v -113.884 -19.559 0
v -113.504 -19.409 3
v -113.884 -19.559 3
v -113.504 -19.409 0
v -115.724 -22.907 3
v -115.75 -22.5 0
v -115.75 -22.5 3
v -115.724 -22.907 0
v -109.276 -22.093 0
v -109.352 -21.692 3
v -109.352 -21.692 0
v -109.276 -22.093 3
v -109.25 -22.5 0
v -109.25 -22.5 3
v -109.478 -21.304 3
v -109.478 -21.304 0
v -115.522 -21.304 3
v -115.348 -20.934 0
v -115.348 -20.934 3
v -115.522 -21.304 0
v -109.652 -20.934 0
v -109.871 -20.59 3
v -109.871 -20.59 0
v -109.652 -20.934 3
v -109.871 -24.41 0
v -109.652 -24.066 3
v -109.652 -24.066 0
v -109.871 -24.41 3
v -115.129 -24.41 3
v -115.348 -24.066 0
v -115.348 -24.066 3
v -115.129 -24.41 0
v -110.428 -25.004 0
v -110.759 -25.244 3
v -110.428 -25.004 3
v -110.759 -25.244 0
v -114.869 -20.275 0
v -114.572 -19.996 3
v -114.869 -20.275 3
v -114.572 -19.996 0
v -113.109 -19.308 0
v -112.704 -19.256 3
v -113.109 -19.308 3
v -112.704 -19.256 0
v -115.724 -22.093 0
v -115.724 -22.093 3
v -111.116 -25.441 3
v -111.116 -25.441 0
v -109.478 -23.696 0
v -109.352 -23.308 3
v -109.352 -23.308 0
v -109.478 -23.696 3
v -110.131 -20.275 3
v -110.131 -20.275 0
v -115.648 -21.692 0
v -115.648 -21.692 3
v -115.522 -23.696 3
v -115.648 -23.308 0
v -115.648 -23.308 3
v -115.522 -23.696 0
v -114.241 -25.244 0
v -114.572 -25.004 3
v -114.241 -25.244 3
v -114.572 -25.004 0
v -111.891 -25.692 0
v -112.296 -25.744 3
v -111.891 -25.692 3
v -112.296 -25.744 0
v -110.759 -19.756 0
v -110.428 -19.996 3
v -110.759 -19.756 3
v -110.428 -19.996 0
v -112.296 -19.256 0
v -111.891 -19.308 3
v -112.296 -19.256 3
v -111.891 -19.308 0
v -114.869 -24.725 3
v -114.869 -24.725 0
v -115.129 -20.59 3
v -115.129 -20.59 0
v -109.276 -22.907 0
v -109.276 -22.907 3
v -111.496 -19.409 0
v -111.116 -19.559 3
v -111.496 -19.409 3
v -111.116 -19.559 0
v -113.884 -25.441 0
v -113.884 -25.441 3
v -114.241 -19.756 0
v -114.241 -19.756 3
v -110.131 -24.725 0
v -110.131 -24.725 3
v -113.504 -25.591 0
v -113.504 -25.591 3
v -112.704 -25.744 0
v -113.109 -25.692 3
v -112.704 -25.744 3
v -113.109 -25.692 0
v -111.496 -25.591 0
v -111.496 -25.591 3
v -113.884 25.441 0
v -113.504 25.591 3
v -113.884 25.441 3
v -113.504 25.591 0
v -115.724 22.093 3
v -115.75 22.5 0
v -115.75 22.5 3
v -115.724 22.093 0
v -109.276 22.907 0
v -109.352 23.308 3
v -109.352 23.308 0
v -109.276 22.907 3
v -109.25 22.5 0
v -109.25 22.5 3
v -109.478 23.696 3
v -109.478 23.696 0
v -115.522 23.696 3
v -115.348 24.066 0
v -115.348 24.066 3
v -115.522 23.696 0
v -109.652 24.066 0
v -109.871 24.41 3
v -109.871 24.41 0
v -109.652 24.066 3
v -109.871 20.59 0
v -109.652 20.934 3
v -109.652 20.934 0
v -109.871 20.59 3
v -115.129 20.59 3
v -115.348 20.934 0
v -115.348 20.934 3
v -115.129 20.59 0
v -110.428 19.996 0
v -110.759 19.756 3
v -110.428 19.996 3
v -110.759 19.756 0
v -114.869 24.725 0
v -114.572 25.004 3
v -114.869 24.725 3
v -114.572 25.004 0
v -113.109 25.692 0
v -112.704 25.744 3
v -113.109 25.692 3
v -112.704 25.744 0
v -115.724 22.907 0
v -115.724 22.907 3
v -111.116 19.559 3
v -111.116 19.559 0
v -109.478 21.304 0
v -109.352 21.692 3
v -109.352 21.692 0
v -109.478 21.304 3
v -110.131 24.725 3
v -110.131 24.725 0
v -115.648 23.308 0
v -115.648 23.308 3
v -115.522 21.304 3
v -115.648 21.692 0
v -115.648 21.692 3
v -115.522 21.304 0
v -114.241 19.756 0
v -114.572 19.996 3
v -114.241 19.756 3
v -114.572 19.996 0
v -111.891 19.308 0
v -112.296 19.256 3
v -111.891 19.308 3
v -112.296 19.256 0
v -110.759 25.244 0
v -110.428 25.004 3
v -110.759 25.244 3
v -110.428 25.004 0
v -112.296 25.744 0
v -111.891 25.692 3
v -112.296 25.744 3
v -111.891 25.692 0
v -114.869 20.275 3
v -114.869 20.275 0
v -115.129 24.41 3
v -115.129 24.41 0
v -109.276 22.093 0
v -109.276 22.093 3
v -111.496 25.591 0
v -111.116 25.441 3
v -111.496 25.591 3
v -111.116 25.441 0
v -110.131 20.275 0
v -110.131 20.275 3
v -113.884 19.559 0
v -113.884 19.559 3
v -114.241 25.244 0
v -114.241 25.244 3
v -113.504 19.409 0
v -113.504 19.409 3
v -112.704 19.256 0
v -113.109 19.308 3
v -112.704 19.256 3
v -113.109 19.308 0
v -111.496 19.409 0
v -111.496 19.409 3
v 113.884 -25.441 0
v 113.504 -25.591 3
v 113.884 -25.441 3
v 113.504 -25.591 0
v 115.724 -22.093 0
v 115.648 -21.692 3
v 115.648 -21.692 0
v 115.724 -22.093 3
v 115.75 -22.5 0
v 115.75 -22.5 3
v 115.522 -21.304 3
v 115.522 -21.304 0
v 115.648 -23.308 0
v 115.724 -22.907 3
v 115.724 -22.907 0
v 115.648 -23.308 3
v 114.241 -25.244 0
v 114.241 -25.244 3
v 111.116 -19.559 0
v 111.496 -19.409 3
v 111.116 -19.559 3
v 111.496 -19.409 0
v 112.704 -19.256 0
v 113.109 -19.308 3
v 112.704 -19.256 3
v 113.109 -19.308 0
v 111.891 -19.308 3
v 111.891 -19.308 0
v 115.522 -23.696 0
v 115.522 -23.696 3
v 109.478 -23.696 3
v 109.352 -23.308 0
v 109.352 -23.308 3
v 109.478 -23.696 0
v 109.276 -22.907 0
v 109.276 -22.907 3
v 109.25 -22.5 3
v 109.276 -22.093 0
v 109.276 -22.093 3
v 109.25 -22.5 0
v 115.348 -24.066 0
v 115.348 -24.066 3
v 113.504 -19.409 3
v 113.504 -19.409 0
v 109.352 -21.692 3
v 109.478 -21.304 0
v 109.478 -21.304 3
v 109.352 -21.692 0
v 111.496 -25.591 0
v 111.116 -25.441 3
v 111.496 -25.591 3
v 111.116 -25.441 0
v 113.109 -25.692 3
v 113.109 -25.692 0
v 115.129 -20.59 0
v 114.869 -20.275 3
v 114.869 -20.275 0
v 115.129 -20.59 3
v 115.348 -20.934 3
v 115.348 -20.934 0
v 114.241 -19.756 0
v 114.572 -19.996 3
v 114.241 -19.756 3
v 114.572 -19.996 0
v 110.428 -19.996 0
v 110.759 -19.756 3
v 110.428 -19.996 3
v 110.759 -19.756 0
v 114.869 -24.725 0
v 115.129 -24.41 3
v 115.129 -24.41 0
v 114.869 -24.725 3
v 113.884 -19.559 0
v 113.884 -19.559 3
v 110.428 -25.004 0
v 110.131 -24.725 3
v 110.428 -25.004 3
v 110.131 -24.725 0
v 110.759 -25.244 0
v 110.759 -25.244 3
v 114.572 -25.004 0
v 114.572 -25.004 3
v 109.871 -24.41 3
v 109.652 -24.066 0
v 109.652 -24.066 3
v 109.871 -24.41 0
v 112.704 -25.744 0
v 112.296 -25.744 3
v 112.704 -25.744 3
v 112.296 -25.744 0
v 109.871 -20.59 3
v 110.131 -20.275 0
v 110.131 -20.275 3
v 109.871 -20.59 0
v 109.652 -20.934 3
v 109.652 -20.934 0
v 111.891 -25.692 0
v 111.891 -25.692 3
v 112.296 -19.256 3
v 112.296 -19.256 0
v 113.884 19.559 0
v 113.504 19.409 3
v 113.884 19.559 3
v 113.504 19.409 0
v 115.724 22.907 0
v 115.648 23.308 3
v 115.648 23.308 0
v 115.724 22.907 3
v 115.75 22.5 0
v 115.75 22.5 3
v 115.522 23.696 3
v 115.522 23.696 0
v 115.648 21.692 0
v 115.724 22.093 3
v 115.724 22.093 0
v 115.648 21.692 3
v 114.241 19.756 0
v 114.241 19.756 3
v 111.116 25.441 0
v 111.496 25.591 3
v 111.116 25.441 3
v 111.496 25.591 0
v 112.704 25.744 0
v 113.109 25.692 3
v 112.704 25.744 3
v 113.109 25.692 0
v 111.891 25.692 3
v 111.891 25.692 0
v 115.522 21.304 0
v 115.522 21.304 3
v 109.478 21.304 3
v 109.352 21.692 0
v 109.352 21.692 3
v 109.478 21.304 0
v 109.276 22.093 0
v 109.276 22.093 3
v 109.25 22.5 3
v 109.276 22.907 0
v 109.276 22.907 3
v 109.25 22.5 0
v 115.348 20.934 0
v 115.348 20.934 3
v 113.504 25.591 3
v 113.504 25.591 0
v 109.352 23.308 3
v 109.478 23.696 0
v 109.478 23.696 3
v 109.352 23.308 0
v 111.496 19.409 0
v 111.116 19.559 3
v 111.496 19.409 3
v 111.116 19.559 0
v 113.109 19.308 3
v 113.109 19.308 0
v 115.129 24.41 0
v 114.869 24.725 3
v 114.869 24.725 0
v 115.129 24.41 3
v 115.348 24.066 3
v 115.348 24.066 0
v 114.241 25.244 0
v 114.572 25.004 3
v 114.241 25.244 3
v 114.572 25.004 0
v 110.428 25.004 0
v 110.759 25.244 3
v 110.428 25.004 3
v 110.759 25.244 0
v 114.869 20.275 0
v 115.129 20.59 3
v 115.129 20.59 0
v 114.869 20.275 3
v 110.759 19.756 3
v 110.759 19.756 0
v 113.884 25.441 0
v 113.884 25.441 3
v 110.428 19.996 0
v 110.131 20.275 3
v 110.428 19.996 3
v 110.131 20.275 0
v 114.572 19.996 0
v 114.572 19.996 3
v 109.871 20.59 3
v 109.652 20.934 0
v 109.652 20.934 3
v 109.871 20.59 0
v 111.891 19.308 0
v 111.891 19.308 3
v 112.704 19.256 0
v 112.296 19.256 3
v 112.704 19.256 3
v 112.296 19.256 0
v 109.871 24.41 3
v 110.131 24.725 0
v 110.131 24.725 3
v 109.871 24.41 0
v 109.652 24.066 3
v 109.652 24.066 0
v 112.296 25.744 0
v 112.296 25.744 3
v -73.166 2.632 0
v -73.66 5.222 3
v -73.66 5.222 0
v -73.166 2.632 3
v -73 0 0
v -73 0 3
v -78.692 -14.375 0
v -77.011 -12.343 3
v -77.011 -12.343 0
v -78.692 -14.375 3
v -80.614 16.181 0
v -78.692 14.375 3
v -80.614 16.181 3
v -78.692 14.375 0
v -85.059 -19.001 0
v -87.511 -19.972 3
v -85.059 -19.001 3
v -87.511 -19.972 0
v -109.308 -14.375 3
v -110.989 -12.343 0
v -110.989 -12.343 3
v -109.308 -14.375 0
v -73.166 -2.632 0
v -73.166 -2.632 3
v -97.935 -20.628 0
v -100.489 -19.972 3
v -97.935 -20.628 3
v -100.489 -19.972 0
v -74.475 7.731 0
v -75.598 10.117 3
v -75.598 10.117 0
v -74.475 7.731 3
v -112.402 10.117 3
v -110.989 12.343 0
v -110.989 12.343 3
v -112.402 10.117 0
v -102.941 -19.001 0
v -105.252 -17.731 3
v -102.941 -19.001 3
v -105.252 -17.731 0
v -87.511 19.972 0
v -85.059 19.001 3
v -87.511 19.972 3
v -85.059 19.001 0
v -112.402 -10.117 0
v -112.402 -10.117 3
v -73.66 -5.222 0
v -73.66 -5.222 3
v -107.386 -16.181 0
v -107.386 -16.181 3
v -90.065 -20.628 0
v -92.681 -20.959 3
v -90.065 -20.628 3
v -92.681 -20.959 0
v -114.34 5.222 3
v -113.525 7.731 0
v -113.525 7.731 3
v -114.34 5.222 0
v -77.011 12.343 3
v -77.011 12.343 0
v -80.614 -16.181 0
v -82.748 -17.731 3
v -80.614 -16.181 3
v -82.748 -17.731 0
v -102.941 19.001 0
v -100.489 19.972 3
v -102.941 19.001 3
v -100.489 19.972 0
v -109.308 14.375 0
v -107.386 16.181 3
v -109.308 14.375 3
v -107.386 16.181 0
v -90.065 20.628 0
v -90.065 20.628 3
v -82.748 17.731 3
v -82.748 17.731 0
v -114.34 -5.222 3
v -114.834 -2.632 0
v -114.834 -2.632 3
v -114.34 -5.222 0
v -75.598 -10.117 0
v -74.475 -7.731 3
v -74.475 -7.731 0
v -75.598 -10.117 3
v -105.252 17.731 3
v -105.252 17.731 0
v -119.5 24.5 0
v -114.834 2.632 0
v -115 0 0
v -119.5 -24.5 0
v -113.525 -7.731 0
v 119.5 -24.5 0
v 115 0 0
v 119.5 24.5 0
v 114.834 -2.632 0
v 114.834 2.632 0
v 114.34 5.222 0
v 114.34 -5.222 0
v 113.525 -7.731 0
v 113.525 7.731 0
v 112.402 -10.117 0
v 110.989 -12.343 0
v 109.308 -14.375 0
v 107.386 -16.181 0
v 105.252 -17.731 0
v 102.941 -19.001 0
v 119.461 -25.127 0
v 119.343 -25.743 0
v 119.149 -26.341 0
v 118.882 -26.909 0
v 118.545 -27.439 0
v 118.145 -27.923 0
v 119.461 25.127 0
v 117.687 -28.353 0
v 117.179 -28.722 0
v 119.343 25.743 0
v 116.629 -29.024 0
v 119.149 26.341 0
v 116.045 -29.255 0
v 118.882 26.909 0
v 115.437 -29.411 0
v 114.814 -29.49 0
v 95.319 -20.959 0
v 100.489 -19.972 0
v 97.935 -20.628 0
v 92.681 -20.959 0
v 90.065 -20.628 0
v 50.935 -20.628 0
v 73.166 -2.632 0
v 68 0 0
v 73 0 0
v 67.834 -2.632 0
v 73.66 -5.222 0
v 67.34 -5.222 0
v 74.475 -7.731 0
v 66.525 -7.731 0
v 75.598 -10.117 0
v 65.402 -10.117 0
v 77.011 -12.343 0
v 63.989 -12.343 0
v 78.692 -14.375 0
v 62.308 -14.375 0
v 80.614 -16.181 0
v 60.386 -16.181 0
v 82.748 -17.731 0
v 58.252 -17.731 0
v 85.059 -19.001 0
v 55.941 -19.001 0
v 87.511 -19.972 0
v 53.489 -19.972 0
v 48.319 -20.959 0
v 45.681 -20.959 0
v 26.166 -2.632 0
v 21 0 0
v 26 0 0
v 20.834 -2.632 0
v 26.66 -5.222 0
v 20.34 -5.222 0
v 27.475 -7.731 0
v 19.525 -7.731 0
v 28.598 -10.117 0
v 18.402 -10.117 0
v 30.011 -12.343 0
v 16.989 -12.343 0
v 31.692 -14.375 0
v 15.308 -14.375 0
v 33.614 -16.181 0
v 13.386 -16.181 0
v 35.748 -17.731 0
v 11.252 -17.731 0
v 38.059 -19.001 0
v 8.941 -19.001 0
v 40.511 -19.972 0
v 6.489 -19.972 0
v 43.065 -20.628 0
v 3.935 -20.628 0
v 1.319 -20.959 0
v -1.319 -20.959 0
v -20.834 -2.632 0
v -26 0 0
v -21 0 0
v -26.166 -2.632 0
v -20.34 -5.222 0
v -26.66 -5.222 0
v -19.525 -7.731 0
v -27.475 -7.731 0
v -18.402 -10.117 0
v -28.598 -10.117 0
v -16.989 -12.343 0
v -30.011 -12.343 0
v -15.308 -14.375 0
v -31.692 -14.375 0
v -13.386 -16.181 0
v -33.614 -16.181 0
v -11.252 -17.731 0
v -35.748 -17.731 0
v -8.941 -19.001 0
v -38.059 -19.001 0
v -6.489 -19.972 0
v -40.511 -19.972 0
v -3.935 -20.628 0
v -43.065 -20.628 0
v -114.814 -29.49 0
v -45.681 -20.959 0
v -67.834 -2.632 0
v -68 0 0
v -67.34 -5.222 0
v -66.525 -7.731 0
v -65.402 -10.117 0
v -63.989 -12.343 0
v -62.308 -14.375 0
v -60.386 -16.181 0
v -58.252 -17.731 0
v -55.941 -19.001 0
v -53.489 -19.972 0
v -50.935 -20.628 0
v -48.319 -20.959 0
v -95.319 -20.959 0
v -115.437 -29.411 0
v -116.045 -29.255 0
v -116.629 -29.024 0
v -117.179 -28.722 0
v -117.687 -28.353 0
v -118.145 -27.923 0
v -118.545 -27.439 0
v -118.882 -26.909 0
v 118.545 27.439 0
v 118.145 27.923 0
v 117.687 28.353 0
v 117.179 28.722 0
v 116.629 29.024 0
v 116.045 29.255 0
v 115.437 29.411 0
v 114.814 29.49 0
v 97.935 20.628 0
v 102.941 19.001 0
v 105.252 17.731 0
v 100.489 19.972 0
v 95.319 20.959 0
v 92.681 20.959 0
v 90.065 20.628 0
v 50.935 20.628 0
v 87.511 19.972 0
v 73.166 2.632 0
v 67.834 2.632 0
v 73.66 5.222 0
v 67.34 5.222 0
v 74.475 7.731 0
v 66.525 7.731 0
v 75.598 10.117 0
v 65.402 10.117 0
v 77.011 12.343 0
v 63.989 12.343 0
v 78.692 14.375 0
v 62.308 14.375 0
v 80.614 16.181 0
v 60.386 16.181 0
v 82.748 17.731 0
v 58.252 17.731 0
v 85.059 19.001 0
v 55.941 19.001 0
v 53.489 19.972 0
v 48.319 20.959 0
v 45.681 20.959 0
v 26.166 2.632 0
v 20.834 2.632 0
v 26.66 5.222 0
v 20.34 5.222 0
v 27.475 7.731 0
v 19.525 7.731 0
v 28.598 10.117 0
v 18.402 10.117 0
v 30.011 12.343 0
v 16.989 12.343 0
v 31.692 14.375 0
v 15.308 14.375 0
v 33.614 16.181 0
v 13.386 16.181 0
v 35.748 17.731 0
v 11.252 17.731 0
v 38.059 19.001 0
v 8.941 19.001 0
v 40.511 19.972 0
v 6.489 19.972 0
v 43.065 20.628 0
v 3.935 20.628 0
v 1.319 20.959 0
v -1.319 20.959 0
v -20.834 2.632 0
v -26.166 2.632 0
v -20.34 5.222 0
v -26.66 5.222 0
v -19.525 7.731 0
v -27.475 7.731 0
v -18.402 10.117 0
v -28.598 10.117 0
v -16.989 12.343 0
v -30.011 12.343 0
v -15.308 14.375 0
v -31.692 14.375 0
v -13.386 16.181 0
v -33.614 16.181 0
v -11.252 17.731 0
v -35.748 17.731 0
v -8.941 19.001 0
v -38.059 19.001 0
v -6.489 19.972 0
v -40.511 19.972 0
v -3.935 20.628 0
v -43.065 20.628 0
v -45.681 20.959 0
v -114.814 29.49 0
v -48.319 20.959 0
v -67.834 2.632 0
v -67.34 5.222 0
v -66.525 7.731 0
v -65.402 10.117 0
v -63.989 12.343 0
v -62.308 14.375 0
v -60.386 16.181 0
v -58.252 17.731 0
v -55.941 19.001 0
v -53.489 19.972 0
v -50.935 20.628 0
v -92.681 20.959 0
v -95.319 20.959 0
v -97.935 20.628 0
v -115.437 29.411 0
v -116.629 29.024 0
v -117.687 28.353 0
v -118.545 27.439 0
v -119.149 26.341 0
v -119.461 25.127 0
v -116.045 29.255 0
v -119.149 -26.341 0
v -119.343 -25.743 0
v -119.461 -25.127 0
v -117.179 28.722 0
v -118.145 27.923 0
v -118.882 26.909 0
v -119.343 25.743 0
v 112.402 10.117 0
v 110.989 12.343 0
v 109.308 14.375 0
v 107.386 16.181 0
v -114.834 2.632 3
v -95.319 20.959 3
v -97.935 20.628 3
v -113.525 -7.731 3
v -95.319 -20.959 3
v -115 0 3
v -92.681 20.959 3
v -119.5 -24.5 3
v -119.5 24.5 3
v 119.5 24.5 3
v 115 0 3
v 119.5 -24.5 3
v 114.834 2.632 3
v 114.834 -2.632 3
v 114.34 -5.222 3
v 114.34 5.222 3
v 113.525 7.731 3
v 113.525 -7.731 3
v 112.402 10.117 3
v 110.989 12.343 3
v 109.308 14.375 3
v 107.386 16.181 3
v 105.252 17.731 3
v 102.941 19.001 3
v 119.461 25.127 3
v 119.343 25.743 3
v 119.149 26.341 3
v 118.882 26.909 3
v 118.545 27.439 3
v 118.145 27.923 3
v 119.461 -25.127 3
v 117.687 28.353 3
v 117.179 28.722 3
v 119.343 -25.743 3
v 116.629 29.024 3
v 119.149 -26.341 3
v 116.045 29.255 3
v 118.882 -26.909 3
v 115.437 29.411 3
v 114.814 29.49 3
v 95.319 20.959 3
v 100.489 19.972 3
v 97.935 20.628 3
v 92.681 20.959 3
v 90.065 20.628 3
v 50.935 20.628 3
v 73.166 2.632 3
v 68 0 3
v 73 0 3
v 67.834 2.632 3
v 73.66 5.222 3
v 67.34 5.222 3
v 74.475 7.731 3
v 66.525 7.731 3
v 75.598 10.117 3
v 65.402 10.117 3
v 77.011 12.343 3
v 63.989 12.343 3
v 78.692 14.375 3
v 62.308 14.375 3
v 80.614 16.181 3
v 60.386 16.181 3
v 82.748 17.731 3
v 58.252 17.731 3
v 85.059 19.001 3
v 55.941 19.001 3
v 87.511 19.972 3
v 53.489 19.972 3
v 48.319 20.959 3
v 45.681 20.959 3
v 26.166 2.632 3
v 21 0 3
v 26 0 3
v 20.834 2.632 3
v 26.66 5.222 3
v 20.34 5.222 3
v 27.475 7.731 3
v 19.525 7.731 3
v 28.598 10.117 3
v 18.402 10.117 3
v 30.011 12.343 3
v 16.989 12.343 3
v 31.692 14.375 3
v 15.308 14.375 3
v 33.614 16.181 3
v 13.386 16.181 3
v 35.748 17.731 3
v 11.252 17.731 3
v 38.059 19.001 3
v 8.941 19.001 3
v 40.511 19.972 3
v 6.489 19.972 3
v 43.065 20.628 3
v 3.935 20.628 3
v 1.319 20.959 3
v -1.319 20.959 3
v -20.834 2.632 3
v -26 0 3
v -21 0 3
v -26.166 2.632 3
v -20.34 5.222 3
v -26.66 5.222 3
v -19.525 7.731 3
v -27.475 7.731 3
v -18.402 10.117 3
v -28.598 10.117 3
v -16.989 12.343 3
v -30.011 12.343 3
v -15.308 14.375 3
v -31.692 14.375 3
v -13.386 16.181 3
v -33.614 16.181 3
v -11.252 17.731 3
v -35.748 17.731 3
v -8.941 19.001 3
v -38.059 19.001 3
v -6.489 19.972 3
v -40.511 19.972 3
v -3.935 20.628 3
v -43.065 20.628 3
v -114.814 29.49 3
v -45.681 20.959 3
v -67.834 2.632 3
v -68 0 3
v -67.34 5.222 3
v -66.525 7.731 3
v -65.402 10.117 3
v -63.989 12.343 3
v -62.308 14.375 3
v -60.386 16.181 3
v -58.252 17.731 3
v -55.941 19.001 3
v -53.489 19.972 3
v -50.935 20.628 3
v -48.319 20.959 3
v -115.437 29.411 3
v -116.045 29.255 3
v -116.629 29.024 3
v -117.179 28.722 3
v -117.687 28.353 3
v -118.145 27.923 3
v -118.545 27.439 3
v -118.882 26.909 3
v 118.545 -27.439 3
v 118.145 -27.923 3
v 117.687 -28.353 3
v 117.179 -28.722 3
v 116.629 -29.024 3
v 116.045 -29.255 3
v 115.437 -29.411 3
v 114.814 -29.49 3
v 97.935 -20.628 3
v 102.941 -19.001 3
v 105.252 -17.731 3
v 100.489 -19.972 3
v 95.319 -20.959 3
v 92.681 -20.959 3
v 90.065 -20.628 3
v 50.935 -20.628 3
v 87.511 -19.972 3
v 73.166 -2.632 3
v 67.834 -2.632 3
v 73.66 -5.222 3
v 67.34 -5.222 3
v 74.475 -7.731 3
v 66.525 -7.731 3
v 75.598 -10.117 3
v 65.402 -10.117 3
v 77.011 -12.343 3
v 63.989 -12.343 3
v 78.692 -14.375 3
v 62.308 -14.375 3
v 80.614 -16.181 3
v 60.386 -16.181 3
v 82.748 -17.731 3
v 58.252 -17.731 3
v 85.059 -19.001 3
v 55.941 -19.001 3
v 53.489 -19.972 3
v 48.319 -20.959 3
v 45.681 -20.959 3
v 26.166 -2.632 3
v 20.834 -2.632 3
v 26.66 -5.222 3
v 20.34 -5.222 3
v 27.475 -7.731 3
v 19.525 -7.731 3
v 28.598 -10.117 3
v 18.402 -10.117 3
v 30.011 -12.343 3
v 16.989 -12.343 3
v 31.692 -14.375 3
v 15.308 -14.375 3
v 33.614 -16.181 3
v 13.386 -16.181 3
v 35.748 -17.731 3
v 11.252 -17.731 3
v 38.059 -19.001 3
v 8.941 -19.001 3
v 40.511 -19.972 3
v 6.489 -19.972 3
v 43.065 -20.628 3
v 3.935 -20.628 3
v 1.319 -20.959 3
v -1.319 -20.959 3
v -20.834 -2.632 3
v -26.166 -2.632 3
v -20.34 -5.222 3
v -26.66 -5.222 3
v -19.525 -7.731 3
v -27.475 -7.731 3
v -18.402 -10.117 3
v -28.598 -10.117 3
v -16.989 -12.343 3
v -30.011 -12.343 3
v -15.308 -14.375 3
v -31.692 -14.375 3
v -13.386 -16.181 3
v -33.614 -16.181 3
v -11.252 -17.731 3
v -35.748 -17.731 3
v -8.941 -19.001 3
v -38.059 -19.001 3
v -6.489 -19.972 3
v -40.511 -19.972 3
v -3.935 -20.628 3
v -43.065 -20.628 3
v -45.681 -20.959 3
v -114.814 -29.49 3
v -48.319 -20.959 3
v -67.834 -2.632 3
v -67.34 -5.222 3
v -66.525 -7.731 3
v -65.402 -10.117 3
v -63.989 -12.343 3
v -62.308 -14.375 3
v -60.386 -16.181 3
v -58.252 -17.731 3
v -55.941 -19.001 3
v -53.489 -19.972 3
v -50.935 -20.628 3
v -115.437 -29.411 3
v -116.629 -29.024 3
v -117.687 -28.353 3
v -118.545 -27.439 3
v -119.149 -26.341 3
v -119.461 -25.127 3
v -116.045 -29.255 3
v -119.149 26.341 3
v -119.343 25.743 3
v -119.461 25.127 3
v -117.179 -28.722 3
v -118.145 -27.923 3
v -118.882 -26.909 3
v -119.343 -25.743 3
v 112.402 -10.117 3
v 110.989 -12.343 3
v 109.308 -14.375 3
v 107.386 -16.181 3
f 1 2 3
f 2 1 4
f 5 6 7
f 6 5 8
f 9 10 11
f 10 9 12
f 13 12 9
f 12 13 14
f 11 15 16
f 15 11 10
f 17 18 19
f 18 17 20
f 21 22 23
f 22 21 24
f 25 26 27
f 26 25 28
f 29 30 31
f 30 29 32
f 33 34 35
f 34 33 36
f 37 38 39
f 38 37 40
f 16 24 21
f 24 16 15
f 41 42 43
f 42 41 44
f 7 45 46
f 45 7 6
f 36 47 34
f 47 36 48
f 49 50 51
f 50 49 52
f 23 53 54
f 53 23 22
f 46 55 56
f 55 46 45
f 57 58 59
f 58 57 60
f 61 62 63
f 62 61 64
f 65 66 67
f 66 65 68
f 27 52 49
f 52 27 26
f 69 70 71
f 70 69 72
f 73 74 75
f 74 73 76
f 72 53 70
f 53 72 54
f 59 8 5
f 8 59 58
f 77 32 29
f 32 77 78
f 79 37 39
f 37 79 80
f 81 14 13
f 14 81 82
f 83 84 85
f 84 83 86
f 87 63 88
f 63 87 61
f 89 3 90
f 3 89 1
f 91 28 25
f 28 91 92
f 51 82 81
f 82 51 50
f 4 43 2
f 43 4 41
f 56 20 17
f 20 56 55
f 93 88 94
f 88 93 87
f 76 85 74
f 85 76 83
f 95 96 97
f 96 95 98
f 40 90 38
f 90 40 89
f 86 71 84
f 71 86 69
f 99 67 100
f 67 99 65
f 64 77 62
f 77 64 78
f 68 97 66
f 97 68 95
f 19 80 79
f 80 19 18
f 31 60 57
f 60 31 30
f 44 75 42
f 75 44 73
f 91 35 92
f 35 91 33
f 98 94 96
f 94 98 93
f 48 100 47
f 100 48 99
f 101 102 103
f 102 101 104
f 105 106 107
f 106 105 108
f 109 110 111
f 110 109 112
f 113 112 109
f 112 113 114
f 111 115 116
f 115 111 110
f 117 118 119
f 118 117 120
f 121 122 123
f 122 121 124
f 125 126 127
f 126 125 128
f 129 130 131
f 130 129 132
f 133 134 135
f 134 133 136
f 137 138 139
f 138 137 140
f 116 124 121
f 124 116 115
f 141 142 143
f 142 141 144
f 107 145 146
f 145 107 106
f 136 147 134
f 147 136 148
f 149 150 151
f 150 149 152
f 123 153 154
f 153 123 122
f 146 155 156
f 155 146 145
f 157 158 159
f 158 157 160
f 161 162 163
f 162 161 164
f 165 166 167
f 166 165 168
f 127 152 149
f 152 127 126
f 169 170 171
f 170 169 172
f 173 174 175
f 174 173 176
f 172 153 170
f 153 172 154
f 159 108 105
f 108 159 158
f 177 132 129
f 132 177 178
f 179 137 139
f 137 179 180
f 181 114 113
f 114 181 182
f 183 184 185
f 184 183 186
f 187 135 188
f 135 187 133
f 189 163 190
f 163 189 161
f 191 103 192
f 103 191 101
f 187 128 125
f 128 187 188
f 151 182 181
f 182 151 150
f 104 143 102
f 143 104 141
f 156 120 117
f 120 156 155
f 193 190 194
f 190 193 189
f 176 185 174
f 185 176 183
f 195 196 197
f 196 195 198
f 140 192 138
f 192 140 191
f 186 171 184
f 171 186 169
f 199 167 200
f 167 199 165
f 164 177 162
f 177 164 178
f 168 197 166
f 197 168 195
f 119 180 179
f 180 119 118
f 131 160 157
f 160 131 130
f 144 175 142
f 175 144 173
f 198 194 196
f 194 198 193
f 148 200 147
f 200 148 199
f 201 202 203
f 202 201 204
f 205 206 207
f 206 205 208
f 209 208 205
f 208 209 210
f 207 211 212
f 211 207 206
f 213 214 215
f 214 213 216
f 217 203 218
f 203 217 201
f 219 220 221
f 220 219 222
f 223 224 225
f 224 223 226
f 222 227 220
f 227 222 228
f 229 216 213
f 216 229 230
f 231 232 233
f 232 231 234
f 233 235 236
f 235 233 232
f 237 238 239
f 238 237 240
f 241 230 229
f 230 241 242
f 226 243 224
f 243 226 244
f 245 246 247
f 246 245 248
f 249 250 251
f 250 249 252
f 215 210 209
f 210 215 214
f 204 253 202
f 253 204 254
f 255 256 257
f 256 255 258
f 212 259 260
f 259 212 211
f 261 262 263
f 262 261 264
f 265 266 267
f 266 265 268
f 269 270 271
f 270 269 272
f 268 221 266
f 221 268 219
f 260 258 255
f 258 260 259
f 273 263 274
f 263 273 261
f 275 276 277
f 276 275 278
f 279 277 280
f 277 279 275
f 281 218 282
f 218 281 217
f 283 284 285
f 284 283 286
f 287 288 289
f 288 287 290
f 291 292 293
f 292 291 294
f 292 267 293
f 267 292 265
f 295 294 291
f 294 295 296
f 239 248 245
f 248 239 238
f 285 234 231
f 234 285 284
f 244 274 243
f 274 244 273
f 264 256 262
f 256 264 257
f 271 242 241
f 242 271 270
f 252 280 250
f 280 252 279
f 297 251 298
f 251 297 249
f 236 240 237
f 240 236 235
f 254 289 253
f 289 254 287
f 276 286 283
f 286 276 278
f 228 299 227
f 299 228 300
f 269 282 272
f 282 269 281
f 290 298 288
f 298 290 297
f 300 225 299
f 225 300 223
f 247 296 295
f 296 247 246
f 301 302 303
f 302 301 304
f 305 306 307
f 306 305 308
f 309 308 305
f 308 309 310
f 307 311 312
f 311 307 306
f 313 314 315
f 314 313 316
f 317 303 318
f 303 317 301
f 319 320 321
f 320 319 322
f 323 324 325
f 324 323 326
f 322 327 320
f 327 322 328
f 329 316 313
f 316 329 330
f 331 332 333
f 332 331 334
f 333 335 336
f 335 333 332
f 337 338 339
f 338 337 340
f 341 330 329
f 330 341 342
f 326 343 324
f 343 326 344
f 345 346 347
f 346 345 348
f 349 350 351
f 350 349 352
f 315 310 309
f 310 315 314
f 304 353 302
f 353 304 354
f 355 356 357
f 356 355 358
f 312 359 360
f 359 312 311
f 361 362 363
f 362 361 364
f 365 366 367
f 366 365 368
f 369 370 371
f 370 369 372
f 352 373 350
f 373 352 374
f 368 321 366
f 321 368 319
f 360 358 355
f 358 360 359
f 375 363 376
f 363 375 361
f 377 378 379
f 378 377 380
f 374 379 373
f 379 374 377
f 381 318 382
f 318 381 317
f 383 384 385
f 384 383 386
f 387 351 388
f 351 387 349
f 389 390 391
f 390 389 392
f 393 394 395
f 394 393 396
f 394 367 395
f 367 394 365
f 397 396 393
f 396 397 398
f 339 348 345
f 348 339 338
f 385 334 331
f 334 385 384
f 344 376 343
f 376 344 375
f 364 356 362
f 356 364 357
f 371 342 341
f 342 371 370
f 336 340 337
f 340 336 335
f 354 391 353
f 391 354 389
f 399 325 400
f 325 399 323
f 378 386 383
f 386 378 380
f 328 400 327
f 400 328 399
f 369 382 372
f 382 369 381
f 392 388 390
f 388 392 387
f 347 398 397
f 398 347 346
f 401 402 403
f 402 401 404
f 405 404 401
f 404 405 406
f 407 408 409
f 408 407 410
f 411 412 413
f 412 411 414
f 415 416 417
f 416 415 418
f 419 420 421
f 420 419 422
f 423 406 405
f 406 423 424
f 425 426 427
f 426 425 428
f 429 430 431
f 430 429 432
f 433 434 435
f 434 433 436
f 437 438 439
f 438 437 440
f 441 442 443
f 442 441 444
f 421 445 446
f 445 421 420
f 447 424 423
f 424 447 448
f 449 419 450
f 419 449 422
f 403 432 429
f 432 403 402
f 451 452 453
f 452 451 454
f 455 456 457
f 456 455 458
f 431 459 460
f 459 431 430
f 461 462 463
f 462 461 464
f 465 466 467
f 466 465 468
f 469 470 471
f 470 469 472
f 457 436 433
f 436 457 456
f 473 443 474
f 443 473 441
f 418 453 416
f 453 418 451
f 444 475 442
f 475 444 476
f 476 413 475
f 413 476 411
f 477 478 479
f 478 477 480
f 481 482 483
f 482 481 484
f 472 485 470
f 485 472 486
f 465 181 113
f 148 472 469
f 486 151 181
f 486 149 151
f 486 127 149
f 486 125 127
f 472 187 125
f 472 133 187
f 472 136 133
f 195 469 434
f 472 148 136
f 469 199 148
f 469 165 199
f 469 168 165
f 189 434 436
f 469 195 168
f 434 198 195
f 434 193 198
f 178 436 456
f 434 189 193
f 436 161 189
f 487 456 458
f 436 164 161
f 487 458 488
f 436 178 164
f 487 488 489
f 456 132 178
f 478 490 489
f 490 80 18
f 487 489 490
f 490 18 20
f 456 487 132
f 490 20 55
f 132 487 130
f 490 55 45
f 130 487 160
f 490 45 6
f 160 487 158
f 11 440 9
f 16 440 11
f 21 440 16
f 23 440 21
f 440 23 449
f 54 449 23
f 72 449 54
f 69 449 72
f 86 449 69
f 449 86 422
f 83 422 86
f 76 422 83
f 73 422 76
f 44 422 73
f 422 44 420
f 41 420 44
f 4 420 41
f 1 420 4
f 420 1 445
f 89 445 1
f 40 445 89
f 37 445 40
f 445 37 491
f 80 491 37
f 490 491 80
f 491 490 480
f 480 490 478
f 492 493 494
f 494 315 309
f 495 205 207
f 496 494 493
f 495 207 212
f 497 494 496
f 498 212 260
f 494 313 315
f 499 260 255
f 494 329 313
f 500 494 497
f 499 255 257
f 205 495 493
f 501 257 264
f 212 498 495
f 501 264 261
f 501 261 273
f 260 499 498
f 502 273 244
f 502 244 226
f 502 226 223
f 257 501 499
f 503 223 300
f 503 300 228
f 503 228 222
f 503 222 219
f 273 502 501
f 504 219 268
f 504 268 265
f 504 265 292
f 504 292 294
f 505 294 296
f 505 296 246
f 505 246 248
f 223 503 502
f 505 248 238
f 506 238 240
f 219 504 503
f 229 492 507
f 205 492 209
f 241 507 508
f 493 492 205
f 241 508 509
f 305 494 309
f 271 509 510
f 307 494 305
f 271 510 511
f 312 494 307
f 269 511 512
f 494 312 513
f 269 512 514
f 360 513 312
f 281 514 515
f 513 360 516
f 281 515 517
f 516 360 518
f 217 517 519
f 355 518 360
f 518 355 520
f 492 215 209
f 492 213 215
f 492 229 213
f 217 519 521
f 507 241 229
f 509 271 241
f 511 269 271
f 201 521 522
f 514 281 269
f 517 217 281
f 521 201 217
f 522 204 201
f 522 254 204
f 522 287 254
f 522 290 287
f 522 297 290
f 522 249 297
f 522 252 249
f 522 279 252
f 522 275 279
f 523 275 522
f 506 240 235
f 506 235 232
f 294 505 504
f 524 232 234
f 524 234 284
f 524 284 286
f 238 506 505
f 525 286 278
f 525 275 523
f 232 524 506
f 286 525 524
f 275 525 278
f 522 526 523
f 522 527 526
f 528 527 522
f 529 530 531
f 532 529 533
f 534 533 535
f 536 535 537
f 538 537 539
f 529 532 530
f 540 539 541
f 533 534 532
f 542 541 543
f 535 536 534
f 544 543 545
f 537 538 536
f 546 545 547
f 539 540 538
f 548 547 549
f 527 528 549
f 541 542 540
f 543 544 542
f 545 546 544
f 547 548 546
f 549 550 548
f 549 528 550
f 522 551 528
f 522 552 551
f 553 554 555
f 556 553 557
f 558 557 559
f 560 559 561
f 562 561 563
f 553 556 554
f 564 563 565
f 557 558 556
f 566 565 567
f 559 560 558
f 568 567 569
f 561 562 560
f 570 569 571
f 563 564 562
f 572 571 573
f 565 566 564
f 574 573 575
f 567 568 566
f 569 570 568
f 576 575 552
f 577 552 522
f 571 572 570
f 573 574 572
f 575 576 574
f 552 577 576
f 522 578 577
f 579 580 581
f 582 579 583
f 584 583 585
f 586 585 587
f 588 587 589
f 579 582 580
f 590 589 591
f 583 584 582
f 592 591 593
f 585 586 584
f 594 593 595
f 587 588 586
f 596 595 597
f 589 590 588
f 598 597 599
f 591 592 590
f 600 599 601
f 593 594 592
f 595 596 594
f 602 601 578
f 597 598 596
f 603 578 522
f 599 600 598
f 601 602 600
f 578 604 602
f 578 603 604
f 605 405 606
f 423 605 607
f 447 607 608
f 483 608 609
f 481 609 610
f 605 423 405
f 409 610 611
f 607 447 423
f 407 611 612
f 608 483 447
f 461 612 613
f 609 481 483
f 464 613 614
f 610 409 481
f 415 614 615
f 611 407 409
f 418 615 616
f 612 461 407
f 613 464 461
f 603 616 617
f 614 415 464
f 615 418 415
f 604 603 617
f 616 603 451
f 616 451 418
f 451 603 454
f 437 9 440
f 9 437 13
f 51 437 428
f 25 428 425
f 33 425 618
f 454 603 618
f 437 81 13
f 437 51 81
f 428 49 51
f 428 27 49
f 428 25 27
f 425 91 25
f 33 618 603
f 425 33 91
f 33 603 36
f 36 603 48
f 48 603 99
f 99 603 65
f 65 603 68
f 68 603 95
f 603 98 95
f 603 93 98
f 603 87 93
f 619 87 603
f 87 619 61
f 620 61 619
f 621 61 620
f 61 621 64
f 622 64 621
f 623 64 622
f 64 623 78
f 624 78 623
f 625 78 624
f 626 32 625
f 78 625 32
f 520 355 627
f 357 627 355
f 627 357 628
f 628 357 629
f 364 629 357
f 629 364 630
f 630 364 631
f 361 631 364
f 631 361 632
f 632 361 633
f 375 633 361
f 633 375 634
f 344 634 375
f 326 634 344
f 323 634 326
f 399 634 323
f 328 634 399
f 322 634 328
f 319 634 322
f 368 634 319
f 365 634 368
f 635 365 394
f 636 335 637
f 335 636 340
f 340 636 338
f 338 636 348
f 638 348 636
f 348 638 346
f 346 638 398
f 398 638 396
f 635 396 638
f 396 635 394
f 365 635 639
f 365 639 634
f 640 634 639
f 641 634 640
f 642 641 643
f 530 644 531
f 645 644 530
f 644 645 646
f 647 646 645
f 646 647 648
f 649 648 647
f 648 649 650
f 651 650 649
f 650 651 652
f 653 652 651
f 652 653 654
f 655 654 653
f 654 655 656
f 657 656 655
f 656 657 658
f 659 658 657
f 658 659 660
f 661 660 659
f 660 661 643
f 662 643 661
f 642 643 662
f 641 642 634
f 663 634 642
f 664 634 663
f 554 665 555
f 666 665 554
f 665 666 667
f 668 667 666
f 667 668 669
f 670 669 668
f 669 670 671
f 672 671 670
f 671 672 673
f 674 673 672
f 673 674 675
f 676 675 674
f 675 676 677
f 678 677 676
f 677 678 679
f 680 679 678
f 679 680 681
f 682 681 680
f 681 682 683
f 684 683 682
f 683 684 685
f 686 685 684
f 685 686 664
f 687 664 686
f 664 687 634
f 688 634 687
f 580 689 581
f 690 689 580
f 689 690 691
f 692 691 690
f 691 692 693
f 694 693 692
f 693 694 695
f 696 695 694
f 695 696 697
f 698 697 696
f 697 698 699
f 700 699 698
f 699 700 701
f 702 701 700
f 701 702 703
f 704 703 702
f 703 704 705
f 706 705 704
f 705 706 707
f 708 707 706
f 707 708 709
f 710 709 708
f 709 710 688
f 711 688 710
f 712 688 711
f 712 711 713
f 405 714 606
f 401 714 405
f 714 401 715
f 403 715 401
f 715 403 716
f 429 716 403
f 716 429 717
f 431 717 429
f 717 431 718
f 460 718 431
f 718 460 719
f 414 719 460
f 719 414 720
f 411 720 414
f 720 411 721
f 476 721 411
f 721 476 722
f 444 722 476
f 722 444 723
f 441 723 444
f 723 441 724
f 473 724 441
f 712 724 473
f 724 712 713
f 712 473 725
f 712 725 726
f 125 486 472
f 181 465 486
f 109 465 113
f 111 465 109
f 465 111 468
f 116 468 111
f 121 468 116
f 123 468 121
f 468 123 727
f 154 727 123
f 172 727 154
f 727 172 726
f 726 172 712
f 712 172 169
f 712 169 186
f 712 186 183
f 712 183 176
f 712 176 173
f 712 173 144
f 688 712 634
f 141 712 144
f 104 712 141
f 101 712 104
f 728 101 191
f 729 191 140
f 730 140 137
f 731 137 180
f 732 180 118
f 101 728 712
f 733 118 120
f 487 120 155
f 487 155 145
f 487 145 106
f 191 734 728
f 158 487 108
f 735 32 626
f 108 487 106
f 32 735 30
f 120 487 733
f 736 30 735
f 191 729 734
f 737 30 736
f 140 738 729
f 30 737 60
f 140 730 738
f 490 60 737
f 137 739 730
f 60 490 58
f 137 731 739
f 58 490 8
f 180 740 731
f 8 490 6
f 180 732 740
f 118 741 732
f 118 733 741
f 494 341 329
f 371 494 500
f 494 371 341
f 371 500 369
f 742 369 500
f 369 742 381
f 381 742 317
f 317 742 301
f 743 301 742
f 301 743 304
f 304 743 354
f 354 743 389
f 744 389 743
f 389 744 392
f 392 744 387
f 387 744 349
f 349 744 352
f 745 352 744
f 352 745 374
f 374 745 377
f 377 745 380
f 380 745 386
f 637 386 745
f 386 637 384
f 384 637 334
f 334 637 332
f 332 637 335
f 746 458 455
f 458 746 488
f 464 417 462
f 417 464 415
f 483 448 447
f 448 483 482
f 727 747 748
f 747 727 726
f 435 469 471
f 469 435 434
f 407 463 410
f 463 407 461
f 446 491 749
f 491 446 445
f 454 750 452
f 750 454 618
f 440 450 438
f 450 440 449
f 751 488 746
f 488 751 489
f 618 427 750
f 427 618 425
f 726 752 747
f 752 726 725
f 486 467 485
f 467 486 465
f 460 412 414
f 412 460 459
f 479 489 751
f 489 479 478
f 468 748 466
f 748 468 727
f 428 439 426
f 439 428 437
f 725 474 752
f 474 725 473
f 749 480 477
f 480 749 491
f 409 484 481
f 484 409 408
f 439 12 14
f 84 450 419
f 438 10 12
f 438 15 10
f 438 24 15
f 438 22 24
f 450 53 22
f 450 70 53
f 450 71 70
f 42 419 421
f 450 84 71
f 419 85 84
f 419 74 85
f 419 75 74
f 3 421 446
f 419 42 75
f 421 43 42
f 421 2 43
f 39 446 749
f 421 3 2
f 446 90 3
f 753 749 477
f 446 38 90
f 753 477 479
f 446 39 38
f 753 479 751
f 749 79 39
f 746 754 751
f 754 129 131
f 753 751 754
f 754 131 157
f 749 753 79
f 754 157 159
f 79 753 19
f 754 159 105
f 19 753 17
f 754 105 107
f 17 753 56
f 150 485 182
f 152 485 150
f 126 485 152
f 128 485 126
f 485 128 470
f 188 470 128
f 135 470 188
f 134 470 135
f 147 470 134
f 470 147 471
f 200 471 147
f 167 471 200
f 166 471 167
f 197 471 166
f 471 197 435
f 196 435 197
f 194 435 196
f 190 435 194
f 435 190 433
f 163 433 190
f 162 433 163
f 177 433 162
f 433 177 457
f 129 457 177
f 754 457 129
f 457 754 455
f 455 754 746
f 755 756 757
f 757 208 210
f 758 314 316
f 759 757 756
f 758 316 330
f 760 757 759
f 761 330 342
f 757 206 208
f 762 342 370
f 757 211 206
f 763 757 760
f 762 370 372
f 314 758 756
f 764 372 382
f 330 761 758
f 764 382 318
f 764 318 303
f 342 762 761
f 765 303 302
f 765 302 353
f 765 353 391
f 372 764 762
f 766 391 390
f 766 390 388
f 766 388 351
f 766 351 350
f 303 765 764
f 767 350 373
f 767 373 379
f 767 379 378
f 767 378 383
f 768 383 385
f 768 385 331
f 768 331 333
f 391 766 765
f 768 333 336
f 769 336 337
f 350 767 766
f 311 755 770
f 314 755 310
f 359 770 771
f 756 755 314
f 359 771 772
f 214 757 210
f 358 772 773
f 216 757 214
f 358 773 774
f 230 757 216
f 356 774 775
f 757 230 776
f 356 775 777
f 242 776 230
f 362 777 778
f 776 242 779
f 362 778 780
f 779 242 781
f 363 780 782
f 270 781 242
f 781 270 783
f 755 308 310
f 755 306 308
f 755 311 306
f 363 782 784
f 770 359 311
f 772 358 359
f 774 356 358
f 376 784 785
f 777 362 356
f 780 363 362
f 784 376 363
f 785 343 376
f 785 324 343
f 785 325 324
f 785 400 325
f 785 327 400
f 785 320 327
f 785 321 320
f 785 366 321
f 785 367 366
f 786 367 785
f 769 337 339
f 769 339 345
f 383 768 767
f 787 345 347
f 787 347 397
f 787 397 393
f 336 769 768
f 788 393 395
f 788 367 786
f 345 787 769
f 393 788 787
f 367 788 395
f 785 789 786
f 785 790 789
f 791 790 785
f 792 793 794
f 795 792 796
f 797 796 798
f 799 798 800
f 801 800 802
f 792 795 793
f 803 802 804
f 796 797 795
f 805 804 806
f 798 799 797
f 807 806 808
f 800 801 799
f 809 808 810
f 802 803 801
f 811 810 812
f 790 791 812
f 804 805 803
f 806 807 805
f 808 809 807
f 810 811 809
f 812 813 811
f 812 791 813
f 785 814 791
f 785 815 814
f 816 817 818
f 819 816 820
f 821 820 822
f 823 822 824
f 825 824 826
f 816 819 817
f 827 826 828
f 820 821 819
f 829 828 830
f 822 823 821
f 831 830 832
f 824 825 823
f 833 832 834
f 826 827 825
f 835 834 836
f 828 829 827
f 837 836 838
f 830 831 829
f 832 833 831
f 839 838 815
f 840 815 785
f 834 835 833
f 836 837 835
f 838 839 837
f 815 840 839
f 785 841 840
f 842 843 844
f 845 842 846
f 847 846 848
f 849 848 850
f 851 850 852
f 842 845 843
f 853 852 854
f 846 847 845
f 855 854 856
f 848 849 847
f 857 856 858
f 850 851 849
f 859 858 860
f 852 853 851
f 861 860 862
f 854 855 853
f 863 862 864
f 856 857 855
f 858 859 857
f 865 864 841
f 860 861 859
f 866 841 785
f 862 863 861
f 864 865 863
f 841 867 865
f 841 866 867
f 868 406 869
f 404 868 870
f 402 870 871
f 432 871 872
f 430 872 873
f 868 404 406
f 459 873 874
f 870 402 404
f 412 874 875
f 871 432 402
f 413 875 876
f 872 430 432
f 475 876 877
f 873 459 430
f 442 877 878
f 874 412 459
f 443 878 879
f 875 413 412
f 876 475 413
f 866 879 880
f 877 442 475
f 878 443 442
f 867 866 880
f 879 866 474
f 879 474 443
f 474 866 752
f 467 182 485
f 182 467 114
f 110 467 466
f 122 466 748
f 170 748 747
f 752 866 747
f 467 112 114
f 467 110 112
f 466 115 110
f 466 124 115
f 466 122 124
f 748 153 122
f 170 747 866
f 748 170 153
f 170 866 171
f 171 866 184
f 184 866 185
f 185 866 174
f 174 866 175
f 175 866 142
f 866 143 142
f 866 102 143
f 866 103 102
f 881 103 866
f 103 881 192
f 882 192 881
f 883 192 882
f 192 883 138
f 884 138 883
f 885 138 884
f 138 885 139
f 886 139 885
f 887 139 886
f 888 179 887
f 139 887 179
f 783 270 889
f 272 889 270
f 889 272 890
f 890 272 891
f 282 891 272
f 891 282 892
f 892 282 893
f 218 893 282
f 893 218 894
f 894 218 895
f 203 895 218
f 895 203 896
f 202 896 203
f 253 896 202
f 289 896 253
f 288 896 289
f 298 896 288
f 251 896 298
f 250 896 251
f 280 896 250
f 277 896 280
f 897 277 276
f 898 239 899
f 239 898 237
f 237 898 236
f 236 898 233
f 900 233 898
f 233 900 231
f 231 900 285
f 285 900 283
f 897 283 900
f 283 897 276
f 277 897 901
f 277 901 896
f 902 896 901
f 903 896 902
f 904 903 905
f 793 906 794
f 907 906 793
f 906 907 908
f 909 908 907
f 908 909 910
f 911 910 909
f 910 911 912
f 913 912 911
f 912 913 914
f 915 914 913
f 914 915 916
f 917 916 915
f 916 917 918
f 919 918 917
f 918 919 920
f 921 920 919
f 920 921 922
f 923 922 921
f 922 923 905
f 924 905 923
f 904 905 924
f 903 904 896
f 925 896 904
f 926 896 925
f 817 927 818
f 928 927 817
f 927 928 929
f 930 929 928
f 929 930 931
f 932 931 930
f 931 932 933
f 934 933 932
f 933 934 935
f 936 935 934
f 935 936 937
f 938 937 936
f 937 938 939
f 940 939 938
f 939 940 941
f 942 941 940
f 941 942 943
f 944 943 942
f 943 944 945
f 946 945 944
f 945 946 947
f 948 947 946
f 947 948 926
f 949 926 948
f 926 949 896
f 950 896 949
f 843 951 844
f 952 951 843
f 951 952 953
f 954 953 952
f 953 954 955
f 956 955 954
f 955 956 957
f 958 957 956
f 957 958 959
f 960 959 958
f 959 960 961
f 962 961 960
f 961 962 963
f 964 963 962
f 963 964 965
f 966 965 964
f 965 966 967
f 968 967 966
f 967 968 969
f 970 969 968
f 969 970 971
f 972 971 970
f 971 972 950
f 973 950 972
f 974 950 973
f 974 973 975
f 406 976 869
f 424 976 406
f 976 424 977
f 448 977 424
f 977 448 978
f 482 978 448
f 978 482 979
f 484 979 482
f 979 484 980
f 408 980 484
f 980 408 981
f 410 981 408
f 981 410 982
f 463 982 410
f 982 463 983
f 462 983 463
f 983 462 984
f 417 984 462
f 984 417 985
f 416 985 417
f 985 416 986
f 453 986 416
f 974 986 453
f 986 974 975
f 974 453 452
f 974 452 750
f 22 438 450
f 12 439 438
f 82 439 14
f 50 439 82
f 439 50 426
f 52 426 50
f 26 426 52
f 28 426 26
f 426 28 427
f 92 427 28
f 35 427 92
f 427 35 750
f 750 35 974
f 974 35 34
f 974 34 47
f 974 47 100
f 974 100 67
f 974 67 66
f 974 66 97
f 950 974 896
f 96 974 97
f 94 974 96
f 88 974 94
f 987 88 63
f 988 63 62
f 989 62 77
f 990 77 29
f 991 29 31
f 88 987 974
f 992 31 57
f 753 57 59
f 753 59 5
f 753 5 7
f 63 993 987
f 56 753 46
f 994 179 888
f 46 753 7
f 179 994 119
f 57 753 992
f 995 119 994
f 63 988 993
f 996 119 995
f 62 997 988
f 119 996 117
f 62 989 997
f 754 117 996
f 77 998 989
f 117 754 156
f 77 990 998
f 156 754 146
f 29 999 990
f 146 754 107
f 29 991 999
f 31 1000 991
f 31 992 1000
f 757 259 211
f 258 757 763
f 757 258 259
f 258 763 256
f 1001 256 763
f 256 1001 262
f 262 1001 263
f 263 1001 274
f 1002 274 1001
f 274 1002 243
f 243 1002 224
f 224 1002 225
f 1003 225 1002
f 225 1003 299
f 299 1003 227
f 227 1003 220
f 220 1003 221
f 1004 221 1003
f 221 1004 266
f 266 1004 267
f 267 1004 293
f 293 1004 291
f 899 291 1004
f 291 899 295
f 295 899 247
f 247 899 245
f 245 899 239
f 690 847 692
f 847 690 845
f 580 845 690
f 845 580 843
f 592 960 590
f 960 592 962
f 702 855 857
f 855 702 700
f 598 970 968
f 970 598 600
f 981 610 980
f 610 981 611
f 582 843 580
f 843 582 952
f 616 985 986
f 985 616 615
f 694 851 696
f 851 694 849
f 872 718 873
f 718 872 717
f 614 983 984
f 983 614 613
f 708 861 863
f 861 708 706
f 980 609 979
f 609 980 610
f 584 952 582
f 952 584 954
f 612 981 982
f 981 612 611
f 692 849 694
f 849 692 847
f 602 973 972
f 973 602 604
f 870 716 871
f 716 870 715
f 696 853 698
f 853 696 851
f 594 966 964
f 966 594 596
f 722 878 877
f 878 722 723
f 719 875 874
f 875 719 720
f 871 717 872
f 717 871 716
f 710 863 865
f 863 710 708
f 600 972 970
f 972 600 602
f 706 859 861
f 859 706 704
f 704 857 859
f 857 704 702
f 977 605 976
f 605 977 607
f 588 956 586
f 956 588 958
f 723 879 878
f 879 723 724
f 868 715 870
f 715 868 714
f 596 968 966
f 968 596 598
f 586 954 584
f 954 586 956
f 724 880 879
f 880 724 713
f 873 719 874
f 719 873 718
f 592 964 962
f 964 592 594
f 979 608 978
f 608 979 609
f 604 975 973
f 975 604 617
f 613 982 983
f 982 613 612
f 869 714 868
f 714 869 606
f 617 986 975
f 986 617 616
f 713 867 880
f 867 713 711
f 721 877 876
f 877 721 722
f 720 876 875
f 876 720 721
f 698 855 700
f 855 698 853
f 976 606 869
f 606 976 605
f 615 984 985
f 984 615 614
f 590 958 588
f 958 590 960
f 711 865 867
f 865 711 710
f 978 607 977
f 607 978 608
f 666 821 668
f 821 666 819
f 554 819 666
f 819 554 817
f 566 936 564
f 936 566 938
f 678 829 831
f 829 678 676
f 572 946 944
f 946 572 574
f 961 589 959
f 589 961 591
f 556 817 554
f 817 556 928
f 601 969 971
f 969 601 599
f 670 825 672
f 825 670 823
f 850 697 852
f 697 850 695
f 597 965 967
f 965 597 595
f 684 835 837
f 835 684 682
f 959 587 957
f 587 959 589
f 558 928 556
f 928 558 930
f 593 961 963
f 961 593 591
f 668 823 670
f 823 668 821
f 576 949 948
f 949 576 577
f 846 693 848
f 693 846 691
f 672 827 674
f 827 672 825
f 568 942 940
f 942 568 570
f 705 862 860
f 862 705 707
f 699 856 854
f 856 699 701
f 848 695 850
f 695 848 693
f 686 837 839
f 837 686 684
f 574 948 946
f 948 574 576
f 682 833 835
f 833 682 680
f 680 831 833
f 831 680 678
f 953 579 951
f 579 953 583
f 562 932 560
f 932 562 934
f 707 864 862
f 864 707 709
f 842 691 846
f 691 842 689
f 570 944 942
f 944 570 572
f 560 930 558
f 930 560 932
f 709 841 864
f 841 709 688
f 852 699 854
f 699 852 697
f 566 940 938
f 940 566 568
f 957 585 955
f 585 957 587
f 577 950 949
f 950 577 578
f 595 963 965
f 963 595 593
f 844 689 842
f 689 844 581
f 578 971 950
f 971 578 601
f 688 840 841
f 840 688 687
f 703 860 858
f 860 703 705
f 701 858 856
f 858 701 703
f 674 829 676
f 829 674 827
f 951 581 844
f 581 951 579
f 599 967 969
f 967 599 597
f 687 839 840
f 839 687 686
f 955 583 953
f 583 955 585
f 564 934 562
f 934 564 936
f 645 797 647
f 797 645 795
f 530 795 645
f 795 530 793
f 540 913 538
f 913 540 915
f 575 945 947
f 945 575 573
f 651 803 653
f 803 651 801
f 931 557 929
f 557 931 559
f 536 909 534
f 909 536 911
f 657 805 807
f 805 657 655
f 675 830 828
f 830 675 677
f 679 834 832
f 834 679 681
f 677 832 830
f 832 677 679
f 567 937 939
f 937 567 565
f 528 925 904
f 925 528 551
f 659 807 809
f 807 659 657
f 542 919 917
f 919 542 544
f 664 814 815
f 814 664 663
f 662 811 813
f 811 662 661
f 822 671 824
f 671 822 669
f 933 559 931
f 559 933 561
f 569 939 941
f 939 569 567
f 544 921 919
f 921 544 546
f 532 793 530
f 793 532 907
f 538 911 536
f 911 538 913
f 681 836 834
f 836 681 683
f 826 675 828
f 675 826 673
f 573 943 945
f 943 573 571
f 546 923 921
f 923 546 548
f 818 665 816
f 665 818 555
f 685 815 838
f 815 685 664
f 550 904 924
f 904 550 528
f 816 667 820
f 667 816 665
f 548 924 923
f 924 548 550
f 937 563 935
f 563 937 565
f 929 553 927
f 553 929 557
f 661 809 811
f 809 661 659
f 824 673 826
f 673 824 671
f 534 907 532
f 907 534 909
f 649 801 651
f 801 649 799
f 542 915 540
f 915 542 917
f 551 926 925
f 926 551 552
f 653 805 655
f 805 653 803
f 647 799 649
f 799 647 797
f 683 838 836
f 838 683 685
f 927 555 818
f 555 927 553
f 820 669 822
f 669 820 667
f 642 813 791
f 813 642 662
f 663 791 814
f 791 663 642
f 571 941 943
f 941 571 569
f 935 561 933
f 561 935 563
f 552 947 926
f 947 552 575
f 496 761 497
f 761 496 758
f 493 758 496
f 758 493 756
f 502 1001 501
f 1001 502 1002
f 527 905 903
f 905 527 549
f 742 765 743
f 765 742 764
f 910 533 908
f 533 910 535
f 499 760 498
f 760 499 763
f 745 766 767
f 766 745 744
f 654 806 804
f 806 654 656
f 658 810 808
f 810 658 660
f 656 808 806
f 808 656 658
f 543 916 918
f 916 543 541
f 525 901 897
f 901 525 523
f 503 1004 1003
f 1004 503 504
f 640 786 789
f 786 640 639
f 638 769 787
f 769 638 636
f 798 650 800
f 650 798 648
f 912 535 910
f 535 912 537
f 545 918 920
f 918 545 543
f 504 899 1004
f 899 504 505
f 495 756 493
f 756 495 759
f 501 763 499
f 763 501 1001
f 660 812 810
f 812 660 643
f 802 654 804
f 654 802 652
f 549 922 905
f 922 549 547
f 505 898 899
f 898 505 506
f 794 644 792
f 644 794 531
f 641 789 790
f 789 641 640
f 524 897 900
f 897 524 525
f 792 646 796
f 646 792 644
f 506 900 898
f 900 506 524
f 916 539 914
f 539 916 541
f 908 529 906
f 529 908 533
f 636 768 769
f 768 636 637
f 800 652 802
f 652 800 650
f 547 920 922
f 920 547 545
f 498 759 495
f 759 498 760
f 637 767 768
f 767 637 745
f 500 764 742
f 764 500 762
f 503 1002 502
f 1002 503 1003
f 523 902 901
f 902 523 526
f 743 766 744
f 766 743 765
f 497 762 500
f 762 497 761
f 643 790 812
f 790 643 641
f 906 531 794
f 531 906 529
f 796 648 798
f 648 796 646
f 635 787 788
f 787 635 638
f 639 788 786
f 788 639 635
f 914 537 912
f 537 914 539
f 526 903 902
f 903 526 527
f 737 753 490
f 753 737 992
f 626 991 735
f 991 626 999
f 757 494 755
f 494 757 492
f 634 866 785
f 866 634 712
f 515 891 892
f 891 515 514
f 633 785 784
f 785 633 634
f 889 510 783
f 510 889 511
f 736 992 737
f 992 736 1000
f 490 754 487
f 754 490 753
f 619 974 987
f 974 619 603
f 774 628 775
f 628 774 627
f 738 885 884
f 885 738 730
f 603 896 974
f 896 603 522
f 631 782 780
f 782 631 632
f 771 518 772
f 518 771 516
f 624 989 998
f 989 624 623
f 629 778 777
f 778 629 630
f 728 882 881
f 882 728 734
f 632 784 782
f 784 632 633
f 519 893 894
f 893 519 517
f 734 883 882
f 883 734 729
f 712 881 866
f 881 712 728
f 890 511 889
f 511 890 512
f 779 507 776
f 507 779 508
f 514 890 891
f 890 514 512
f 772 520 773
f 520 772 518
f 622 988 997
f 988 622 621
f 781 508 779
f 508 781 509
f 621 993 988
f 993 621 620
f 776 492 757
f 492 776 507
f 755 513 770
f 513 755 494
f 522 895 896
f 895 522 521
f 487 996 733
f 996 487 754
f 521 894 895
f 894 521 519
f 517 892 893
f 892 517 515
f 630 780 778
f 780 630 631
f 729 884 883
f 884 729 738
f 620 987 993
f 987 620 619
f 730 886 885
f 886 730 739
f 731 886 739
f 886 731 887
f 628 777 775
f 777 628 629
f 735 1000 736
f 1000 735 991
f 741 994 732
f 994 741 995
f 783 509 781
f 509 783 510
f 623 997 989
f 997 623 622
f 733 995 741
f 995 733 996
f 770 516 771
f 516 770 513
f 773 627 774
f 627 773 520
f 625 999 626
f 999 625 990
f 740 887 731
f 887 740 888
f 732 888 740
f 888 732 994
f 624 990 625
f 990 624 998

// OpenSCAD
$fn = 50;


difference() {
	union() {
		hull() {
			translate(v = [-114.5000000000, 24.5000000000, 0]) {
				cylinder(h = 3, r = 5);
			}
			translate(v = [114.5000000000, 24.5000000000, 0]) {
				cylinder(h = 3, r = 5);
			}
			translate(v = [-114.5000000000, -24.5000000000, 0]) {
				cylinder(h = 3, r = 5);
			}
			translate(v = [114.5000000000, -24.5000000000, 0]) {
				cylinder(h = 3, r = 5);
			}
		}
	}
	union() {
		#translate(v = [-112.5000000000, -22.5000000000, -100.0000000000]) {
			cylinder(h = 200, r = 3.2500000000);
		}
		#translate(v = [-112.5000000000, 22.5000000000, -100.0000000000]) {
			cylinder(h = 200, r = 3.2500000000);
		}
		#translate(v = [112.5000000000, -22.5000000000, -100.0000000000]) {
			cylinder(h = 200, r = 3.2500000000);
		}
		#translate(v = [112.5000000000, 22.5000000000, -100.0000000000]) {
			cylinder(h = 200, r = 3.2500000000);
		}
		#translate(v = [-94.0000000000, 0, 0]) {
			cylinder(h = 3, r = 21.0000000000);
		}
		#translate(v = [-47.0000000000, 0, 0]) {
			cylinder(h = 3, r = 21.0000000000);
		}
		#cylinder(h = 3, r = 21.0000000000);
		#translate(v = [47.0000000000, 0, 0]) {
			cylinder(h = 3, r = 21.0000000000);
		}
		#translate(v = [94.0000000000, 0, 0]) {
			cylinder(h = 3, r = 21.0000000000);
		}
	}
}
